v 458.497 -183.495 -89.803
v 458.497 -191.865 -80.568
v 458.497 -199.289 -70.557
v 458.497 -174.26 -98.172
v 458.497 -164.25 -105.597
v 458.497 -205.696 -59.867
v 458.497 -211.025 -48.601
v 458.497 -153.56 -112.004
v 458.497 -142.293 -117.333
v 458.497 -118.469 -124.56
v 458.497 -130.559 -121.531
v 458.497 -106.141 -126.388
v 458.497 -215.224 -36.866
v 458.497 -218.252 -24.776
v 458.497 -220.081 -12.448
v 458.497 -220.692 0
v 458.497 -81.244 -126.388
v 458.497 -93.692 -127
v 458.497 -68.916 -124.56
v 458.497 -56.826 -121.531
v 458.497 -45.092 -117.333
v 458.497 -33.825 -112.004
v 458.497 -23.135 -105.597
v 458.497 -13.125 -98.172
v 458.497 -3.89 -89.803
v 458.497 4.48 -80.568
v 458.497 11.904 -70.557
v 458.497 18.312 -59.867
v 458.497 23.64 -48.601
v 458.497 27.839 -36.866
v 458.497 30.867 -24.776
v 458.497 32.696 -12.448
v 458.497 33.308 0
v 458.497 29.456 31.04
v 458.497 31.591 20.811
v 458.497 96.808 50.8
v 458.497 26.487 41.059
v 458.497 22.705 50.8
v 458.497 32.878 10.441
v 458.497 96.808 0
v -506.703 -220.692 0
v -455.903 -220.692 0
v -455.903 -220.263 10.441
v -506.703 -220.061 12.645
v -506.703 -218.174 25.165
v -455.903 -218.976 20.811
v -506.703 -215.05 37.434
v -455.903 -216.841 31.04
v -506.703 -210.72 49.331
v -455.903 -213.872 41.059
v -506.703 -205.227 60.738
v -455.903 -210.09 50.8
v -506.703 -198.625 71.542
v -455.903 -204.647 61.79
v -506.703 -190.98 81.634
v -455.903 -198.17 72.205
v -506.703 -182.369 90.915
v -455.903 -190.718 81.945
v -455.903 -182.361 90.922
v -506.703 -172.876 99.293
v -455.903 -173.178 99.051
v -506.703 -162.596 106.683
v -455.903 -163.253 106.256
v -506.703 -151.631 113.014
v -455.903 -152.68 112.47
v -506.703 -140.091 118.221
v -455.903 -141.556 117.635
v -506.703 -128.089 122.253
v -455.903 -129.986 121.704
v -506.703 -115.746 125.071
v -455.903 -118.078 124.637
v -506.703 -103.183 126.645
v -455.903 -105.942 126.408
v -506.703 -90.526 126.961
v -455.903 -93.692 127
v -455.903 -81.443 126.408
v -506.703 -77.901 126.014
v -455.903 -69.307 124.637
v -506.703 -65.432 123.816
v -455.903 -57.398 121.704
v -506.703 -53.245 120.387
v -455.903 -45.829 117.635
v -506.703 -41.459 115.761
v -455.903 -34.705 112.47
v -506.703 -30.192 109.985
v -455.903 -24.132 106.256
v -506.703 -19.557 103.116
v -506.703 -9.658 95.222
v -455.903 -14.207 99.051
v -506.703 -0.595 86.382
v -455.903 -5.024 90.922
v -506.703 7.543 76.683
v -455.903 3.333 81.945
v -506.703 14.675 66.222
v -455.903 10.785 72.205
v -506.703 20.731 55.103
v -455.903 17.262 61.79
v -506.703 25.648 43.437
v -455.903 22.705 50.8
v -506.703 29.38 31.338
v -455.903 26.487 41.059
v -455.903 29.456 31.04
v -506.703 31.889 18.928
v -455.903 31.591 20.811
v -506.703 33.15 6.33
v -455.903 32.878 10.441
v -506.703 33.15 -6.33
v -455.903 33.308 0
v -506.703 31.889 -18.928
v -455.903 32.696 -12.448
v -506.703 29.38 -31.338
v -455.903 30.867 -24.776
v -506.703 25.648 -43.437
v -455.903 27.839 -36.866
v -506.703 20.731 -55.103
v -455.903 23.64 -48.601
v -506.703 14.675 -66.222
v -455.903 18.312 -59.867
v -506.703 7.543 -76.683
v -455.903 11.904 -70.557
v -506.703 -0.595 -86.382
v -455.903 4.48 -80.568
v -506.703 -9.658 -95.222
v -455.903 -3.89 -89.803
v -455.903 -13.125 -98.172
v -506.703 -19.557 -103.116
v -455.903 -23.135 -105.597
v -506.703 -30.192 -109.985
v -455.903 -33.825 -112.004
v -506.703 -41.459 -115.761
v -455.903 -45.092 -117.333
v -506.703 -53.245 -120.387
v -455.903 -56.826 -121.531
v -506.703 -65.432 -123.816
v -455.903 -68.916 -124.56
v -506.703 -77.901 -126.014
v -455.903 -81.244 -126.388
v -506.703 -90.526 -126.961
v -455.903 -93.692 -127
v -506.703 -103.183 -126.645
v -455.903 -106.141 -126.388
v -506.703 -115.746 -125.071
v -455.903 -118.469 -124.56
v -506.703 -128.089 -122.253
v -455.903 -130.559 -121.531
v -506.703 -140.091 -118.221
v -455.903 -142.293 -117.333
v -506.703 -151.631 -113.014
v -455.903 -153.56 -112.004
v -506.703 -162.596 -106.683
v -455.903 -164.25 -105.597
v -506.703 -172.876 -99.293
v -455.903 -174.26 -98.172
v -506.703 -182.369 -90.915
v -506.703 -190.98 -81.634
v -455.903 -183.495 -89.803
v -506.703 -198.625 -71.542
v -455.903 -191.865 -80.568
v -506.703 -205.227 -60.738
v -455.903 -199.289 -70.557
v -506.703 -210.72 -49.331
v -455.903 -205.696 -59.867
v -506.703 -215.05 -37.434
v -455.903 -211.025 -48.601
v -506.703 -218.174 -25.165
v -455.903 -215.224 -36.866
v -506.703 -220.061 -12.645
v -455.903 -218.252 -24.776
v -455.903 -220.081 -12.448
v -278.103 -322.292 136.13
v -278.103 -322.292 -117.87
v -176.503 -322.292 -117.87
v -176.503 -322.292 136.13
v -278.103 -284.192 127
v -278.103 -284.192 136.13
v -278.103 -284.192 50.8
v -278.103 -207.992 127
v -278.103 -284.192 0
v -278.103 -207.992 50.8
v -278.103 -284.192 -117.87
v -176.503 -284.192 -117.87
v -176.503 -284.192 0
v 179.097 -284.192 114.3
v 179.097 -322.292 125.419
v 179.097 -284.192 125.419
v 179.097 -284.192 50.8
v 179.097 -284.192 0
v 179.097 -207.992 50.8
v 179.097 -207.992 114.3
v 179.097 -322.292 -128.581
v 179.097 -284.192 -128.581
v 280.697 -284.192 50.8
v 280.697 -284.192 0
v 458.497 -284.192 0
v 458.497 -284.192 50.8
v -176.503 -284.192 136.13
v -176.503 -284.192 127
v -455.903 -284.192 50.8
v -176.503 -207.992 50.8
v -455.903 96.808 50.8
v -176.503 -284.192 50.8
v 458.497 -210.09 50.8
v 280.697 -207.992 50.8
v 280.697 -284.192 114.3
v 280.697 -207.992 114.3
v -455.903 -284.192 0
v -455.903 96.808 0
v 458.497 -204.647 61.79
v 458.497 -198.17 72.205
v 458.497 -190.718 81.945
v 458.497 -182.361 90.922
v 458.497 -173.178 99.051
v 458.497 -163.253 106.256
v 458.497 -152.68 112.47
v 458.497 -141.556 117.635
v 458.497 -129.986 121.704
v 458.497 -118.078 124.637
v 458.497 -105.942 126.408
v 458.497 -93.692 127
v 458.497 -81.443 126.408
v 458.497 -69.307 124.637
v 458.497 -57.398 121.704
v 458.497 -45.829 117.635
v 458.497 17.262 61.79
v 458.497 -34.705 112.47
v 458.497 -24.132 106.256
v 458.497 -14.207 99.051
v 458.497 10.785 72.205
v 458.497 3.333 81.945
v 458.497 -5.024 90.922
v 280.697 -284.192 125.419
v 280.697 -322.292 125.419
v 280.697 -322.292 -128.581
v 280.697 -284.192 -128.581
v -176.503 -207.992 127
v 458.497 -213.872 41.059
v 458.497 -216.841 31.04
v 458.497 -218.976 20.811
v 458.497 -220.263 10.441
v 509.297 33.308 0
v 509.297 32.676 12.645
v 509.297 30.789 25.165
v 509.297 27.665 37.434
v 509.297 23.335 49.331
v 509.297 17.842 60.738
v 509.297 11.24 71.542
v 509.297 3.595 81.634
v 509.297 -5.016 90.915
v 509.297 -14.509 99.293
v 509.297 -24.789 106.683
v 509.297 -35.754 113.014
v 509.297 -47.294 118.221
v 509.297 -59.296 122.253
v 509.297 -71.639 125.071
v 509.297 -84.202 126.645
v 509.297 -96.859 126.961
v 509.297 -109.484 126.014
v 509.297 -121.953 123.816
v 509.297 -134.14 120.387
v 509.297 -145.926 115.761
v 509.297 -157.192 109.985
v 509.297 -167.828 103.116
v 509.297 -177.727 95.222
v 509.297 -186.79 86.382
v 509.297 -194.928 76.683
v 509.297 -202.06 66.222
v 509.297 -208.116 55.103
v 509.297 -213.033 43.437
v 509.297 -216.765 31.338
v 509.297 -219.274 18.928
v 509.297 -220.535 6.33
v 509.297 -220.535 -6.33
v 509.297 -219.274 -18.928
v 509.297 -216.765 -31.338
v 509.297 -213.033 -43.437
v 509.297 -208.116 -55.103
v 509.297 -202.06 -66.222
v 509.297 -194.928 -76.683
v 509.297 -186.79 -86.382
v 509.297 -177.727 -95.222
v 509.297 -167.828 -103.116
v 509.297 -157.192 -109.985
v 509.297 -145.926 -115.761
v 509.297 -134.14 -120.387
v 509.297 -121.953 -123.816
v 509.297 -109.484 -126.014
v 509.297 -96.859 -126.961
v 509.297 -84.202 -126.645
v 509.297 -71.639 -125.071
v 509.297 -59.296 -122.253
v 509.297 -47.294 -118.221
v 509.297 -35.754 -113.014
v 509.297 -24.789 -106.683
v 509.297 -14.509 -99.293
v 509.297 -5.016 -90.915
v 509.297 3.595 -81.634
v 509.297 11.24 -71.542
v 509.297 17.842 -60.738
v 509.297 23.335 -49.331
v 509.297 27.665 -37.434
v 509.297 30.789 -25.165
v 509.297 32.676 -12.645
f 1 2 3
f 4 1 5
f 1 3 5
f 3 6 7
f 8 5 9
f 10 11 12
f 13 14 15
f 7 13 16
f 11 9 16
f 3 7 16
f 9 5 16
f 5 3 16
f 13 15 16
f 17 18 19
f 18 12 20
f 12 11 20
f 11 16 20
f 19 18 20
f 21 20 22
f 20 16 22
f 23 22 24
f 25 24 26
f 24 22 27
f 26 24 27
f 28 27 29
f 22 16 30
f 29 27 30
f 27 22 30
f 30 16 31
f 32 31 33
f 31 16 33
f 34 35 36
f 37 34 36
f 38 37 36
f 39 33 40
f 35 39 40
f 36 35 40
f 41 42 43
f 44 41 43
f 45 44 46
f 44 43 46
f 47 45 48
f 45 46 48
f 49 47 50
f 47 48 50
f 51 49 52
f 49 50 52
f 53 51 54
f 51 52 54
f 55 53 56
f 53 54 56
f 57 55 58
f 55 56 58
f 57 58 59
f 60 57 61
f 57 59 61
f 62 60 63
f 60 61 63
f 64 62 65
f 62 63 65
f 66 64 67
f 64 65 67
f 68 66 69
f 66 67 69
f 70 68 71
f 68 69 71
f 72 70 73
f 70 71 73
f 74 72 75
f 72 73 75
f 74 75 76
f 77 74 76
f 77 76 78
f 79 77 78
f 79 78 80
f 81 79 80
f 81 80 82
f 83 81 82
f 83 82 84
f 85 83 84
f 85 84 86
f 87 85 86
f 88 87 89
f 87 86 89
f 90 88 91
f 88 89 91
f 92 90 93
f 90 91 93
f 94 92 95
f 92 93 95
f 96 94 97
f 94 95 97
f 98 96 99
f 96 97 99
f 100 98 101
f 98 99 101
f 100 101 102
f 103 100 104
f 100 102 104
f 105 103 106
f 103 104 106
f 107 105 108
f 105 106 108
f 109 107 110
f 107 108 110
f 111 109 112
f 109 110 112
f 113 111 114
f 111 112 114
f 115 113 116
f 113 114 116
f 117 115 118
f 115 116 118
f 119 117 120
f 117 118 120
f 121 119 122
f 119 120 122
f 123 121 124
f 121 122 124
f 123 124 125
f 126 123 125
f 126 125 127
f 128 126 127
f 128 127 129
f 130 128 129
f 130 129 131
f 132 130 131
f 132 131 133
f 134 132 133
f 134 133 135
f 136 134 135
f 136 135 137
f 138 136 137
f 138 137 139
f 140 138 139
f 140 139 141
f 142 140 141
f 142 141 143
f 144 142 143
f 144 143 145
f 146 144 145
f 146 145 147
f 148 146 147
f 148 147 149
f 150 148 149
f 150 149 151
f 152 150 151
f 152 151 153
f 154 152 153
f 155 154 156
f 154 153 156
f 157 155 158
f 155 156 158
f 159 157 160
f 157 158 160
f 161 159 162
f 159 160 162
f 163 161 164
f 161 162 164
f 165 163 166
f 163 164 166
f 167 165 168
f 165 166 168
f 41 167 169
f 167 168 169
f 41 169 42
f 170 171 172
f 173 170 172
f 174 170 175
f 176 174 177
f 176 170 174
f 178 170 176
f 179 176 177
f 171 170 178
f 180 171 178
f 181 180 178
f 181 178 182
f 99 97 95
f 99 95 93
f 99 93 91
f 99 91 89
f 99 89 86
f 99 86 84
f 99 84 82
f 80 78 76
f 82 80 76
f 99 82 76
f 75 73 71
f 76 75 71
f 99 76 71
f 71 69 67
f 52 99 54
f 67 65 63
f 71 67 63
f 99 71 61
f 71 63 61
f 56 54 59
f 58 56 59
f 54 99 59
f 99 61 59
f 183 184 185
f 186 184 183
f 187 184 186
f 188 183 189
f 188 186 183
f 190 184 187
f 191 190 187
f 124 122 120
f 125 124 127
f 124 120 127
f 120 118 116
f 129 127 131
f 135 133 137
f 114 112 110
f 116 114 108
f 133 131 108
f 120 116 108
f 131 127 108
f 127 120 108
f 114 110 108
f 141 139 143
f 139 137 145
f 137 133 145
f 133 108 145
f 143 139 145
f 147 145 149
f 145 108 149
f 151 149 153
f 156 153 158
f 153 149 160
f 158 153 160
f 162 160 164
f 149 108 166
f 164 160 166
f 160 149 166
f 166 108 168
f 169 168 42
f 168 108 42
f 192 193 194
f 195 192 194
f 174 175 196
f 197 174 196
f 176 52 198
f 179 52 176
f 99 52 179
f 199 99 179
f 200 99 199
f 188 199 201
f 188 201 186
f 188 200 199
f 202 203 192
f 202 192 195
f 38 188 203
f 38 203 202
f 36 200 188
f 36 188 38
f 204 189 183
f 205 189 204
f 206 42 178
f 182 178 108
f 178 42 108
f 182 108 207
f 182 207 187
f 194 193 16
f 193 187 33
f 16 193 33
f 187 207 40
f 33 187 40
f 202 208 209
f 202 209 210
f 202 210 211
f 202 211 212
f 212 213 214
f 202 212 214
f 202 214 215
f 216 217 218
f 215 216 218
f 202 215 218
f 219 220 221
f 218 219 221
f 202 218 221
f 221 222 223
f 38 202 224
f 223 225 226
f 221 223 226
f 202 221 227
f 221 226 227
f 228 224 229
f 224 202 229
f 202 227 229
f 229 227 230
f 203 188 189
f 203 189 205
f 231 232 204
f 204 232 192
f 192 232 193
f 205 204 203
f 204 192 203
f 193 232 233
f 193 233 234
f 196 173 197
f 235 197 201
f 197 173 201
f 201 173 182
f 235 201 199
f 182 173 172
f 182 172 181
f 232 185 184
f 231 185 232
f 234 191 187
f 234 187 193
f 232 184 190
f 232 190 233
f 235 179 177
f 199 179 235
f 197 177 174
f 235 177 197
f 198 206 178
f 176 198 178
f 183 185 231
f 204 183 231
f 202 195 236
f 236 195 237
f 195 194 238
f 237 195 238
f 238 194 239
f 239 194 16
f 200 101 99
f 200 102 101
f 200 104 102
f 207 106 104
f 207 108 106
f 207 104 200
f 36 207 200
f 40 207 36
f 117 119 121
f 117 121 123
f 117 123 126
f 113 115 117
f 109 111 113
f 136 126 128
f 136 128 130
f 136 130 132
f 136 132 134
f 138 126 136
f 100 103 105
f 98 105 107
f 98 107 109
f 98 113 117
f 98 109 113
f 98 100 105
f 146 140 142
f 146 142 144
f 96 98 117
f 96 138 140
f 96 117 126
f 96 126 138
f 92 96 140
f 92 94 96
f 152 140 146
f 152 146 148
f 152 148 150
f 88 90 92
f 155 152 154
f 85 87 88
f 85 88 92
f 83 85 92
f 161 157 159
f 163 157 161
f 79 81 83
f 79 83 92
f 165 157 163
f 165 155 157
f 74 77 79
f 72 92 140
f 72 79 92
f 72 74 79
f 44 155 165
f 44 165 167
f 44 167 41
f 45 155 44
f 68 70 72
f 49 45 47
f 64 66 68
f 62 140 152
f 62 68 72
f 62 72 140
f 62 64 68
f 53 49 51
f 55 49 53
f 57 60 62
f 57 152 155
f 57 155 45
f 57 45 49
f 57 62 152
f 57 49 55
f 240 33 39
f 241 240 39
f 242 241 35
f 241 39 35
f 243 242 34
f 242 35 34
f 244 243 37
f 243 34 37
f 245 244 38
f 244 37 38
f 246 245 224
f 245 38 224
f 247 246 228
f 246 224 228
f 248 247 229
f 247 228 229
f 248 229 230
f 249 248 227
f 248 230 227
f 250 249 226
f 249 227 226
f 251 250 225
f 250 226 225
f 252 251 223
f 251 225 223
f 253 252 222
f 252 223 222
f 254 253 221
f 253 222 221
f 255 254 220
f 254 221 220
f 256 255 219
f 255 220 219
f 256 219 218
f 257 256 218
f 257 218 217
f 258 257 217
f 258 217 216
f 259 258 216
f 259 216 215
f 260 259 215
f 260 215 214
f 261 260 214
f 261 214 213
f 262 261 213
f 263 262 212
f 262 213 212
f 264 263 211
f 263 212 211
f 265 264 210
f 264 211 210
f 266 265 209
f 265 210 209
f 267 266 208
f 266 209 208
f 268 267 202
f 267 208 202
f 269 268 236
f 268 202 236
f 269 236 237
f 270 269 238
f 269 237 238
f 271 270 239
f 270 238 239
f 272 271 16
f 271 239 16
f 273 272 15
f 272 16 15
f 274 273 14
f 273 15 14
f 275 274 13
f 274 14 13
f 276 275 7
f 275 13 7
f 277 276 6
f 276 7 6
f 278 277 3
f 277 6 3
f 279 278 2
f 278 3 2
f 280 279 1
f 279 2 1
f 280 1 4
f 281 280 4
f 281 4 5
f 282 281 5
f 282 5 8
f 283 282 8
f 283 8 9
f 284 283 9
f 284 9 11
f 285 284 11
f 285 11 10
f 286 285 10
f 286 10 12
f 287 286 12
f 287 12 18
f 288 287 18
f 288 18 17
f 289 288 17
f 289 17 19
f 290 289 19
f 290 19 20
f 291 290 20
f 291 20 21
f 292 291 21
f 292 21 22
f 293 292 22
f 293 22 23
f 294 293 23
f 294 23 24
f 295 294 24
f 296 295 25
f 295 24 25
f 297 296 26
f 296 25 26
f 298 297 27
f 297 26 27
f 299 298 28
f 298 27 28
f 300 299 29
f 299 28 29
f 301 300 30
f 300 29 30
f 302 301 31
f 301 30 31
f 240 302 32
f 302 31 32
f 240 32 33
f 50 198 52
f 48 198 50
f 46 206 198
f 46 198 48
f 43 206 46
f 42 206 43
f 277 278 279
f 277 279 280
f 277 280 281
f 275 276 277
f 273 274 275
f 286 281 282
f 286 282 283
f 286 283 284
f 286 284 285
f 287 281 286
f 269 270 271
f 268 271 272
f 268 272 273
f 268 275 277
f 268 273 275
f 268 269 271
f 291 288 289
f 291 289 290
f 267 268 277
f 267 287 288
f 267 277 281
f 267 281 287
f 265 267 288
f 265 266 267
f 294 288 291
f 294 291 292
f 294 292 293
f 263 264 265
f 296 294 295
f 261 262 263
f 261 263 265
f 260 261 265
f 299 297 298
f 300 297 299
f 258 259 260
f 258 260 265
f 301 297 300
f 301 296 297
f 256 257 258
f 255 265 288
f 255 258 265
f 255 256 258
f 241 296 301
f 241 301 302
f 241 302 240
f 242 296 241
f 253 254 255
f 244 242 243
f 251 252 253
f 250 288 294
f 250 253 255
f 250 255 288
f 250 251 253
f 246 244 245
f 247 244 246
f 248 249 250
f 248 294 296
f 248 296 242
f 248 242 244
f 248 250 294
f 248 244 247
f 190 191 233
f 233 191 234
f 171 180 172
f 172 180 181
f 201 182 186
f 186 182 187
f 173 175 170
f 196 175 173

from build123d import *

# Parameters (mm, degrees)
F0_W      = 914.4
F0_H      = 381
F1_DEPTH  = 50.8
F2_R      = 127
F3_DEPTH  = 50.8
F4_R      = 127
F5_DEPTH  = 50.8
F6_W      = 101.6
F6_H      = 254
F7_DEPTH  = 38.1
F8_W      = 101.6
F8_H      = 76.2
F9_DEPTH  = 76.2
F10_W     = 101.6
F10_H     = 76.2
F11_DEPTH = 63.5


with BuildPart() as f1:
    # F0 (on Top) → F1 (new body)
    with BuildSketch(Plane.XY):
        with Locations((1.296762, -93.692474)):
            Rectangle(F0_W, F0_H)
    extrude(amount=F1_DEPTH)

    # F2 (on face) → F3 (join)
    with BuildSketch(Plane.YZ.offset(458.496762)):
        with Locations((-93.692474, 0)):
            Circle(F2_R)
    extrude(amount=F3_DEPTH)

    # F4 (on face) → F5 (join)
    with BuildSketch(Plane(origin=(-455.903238, 0, 0), x_dir=(0, -1, 0), z_dir=(-1, 0, 0))):
        with Locations((93.692474, 0)):
            Circle(F4_R)
    extrude(amount=F5_DEPTH)

    # F6 (on face) → F7 (join)
    with BuildSketch(Plane.XZ.offset(284.192474)):
        with Locations((-227.303238, 9.129721)):
            Rectangle(F6_W, F6_H)
        with Locations((229.896762, -1.581132)):
            Rectangle(F6_W, F6_H)
    extrude(amount=F7_DEPTH)

    # F8 (on face) → F9 (join)
    with BuildSketch(Plane.XY.offset(50.8)):
        with Locations((-227.303238, -246.092474)):
            Rectangle(F8_W, F8_H)
    extrude(amount=F9_DEPTH)

    # F10 (on face) → F11 (join)
    with BuildSketch(Plane.XY.offset(50.8)):
        with Locations((229.896762, -246.092474)):
            Rectangle(F10_W, F10_H)
    extrude(amount=F11_DEPTH)


solid = f1.part
